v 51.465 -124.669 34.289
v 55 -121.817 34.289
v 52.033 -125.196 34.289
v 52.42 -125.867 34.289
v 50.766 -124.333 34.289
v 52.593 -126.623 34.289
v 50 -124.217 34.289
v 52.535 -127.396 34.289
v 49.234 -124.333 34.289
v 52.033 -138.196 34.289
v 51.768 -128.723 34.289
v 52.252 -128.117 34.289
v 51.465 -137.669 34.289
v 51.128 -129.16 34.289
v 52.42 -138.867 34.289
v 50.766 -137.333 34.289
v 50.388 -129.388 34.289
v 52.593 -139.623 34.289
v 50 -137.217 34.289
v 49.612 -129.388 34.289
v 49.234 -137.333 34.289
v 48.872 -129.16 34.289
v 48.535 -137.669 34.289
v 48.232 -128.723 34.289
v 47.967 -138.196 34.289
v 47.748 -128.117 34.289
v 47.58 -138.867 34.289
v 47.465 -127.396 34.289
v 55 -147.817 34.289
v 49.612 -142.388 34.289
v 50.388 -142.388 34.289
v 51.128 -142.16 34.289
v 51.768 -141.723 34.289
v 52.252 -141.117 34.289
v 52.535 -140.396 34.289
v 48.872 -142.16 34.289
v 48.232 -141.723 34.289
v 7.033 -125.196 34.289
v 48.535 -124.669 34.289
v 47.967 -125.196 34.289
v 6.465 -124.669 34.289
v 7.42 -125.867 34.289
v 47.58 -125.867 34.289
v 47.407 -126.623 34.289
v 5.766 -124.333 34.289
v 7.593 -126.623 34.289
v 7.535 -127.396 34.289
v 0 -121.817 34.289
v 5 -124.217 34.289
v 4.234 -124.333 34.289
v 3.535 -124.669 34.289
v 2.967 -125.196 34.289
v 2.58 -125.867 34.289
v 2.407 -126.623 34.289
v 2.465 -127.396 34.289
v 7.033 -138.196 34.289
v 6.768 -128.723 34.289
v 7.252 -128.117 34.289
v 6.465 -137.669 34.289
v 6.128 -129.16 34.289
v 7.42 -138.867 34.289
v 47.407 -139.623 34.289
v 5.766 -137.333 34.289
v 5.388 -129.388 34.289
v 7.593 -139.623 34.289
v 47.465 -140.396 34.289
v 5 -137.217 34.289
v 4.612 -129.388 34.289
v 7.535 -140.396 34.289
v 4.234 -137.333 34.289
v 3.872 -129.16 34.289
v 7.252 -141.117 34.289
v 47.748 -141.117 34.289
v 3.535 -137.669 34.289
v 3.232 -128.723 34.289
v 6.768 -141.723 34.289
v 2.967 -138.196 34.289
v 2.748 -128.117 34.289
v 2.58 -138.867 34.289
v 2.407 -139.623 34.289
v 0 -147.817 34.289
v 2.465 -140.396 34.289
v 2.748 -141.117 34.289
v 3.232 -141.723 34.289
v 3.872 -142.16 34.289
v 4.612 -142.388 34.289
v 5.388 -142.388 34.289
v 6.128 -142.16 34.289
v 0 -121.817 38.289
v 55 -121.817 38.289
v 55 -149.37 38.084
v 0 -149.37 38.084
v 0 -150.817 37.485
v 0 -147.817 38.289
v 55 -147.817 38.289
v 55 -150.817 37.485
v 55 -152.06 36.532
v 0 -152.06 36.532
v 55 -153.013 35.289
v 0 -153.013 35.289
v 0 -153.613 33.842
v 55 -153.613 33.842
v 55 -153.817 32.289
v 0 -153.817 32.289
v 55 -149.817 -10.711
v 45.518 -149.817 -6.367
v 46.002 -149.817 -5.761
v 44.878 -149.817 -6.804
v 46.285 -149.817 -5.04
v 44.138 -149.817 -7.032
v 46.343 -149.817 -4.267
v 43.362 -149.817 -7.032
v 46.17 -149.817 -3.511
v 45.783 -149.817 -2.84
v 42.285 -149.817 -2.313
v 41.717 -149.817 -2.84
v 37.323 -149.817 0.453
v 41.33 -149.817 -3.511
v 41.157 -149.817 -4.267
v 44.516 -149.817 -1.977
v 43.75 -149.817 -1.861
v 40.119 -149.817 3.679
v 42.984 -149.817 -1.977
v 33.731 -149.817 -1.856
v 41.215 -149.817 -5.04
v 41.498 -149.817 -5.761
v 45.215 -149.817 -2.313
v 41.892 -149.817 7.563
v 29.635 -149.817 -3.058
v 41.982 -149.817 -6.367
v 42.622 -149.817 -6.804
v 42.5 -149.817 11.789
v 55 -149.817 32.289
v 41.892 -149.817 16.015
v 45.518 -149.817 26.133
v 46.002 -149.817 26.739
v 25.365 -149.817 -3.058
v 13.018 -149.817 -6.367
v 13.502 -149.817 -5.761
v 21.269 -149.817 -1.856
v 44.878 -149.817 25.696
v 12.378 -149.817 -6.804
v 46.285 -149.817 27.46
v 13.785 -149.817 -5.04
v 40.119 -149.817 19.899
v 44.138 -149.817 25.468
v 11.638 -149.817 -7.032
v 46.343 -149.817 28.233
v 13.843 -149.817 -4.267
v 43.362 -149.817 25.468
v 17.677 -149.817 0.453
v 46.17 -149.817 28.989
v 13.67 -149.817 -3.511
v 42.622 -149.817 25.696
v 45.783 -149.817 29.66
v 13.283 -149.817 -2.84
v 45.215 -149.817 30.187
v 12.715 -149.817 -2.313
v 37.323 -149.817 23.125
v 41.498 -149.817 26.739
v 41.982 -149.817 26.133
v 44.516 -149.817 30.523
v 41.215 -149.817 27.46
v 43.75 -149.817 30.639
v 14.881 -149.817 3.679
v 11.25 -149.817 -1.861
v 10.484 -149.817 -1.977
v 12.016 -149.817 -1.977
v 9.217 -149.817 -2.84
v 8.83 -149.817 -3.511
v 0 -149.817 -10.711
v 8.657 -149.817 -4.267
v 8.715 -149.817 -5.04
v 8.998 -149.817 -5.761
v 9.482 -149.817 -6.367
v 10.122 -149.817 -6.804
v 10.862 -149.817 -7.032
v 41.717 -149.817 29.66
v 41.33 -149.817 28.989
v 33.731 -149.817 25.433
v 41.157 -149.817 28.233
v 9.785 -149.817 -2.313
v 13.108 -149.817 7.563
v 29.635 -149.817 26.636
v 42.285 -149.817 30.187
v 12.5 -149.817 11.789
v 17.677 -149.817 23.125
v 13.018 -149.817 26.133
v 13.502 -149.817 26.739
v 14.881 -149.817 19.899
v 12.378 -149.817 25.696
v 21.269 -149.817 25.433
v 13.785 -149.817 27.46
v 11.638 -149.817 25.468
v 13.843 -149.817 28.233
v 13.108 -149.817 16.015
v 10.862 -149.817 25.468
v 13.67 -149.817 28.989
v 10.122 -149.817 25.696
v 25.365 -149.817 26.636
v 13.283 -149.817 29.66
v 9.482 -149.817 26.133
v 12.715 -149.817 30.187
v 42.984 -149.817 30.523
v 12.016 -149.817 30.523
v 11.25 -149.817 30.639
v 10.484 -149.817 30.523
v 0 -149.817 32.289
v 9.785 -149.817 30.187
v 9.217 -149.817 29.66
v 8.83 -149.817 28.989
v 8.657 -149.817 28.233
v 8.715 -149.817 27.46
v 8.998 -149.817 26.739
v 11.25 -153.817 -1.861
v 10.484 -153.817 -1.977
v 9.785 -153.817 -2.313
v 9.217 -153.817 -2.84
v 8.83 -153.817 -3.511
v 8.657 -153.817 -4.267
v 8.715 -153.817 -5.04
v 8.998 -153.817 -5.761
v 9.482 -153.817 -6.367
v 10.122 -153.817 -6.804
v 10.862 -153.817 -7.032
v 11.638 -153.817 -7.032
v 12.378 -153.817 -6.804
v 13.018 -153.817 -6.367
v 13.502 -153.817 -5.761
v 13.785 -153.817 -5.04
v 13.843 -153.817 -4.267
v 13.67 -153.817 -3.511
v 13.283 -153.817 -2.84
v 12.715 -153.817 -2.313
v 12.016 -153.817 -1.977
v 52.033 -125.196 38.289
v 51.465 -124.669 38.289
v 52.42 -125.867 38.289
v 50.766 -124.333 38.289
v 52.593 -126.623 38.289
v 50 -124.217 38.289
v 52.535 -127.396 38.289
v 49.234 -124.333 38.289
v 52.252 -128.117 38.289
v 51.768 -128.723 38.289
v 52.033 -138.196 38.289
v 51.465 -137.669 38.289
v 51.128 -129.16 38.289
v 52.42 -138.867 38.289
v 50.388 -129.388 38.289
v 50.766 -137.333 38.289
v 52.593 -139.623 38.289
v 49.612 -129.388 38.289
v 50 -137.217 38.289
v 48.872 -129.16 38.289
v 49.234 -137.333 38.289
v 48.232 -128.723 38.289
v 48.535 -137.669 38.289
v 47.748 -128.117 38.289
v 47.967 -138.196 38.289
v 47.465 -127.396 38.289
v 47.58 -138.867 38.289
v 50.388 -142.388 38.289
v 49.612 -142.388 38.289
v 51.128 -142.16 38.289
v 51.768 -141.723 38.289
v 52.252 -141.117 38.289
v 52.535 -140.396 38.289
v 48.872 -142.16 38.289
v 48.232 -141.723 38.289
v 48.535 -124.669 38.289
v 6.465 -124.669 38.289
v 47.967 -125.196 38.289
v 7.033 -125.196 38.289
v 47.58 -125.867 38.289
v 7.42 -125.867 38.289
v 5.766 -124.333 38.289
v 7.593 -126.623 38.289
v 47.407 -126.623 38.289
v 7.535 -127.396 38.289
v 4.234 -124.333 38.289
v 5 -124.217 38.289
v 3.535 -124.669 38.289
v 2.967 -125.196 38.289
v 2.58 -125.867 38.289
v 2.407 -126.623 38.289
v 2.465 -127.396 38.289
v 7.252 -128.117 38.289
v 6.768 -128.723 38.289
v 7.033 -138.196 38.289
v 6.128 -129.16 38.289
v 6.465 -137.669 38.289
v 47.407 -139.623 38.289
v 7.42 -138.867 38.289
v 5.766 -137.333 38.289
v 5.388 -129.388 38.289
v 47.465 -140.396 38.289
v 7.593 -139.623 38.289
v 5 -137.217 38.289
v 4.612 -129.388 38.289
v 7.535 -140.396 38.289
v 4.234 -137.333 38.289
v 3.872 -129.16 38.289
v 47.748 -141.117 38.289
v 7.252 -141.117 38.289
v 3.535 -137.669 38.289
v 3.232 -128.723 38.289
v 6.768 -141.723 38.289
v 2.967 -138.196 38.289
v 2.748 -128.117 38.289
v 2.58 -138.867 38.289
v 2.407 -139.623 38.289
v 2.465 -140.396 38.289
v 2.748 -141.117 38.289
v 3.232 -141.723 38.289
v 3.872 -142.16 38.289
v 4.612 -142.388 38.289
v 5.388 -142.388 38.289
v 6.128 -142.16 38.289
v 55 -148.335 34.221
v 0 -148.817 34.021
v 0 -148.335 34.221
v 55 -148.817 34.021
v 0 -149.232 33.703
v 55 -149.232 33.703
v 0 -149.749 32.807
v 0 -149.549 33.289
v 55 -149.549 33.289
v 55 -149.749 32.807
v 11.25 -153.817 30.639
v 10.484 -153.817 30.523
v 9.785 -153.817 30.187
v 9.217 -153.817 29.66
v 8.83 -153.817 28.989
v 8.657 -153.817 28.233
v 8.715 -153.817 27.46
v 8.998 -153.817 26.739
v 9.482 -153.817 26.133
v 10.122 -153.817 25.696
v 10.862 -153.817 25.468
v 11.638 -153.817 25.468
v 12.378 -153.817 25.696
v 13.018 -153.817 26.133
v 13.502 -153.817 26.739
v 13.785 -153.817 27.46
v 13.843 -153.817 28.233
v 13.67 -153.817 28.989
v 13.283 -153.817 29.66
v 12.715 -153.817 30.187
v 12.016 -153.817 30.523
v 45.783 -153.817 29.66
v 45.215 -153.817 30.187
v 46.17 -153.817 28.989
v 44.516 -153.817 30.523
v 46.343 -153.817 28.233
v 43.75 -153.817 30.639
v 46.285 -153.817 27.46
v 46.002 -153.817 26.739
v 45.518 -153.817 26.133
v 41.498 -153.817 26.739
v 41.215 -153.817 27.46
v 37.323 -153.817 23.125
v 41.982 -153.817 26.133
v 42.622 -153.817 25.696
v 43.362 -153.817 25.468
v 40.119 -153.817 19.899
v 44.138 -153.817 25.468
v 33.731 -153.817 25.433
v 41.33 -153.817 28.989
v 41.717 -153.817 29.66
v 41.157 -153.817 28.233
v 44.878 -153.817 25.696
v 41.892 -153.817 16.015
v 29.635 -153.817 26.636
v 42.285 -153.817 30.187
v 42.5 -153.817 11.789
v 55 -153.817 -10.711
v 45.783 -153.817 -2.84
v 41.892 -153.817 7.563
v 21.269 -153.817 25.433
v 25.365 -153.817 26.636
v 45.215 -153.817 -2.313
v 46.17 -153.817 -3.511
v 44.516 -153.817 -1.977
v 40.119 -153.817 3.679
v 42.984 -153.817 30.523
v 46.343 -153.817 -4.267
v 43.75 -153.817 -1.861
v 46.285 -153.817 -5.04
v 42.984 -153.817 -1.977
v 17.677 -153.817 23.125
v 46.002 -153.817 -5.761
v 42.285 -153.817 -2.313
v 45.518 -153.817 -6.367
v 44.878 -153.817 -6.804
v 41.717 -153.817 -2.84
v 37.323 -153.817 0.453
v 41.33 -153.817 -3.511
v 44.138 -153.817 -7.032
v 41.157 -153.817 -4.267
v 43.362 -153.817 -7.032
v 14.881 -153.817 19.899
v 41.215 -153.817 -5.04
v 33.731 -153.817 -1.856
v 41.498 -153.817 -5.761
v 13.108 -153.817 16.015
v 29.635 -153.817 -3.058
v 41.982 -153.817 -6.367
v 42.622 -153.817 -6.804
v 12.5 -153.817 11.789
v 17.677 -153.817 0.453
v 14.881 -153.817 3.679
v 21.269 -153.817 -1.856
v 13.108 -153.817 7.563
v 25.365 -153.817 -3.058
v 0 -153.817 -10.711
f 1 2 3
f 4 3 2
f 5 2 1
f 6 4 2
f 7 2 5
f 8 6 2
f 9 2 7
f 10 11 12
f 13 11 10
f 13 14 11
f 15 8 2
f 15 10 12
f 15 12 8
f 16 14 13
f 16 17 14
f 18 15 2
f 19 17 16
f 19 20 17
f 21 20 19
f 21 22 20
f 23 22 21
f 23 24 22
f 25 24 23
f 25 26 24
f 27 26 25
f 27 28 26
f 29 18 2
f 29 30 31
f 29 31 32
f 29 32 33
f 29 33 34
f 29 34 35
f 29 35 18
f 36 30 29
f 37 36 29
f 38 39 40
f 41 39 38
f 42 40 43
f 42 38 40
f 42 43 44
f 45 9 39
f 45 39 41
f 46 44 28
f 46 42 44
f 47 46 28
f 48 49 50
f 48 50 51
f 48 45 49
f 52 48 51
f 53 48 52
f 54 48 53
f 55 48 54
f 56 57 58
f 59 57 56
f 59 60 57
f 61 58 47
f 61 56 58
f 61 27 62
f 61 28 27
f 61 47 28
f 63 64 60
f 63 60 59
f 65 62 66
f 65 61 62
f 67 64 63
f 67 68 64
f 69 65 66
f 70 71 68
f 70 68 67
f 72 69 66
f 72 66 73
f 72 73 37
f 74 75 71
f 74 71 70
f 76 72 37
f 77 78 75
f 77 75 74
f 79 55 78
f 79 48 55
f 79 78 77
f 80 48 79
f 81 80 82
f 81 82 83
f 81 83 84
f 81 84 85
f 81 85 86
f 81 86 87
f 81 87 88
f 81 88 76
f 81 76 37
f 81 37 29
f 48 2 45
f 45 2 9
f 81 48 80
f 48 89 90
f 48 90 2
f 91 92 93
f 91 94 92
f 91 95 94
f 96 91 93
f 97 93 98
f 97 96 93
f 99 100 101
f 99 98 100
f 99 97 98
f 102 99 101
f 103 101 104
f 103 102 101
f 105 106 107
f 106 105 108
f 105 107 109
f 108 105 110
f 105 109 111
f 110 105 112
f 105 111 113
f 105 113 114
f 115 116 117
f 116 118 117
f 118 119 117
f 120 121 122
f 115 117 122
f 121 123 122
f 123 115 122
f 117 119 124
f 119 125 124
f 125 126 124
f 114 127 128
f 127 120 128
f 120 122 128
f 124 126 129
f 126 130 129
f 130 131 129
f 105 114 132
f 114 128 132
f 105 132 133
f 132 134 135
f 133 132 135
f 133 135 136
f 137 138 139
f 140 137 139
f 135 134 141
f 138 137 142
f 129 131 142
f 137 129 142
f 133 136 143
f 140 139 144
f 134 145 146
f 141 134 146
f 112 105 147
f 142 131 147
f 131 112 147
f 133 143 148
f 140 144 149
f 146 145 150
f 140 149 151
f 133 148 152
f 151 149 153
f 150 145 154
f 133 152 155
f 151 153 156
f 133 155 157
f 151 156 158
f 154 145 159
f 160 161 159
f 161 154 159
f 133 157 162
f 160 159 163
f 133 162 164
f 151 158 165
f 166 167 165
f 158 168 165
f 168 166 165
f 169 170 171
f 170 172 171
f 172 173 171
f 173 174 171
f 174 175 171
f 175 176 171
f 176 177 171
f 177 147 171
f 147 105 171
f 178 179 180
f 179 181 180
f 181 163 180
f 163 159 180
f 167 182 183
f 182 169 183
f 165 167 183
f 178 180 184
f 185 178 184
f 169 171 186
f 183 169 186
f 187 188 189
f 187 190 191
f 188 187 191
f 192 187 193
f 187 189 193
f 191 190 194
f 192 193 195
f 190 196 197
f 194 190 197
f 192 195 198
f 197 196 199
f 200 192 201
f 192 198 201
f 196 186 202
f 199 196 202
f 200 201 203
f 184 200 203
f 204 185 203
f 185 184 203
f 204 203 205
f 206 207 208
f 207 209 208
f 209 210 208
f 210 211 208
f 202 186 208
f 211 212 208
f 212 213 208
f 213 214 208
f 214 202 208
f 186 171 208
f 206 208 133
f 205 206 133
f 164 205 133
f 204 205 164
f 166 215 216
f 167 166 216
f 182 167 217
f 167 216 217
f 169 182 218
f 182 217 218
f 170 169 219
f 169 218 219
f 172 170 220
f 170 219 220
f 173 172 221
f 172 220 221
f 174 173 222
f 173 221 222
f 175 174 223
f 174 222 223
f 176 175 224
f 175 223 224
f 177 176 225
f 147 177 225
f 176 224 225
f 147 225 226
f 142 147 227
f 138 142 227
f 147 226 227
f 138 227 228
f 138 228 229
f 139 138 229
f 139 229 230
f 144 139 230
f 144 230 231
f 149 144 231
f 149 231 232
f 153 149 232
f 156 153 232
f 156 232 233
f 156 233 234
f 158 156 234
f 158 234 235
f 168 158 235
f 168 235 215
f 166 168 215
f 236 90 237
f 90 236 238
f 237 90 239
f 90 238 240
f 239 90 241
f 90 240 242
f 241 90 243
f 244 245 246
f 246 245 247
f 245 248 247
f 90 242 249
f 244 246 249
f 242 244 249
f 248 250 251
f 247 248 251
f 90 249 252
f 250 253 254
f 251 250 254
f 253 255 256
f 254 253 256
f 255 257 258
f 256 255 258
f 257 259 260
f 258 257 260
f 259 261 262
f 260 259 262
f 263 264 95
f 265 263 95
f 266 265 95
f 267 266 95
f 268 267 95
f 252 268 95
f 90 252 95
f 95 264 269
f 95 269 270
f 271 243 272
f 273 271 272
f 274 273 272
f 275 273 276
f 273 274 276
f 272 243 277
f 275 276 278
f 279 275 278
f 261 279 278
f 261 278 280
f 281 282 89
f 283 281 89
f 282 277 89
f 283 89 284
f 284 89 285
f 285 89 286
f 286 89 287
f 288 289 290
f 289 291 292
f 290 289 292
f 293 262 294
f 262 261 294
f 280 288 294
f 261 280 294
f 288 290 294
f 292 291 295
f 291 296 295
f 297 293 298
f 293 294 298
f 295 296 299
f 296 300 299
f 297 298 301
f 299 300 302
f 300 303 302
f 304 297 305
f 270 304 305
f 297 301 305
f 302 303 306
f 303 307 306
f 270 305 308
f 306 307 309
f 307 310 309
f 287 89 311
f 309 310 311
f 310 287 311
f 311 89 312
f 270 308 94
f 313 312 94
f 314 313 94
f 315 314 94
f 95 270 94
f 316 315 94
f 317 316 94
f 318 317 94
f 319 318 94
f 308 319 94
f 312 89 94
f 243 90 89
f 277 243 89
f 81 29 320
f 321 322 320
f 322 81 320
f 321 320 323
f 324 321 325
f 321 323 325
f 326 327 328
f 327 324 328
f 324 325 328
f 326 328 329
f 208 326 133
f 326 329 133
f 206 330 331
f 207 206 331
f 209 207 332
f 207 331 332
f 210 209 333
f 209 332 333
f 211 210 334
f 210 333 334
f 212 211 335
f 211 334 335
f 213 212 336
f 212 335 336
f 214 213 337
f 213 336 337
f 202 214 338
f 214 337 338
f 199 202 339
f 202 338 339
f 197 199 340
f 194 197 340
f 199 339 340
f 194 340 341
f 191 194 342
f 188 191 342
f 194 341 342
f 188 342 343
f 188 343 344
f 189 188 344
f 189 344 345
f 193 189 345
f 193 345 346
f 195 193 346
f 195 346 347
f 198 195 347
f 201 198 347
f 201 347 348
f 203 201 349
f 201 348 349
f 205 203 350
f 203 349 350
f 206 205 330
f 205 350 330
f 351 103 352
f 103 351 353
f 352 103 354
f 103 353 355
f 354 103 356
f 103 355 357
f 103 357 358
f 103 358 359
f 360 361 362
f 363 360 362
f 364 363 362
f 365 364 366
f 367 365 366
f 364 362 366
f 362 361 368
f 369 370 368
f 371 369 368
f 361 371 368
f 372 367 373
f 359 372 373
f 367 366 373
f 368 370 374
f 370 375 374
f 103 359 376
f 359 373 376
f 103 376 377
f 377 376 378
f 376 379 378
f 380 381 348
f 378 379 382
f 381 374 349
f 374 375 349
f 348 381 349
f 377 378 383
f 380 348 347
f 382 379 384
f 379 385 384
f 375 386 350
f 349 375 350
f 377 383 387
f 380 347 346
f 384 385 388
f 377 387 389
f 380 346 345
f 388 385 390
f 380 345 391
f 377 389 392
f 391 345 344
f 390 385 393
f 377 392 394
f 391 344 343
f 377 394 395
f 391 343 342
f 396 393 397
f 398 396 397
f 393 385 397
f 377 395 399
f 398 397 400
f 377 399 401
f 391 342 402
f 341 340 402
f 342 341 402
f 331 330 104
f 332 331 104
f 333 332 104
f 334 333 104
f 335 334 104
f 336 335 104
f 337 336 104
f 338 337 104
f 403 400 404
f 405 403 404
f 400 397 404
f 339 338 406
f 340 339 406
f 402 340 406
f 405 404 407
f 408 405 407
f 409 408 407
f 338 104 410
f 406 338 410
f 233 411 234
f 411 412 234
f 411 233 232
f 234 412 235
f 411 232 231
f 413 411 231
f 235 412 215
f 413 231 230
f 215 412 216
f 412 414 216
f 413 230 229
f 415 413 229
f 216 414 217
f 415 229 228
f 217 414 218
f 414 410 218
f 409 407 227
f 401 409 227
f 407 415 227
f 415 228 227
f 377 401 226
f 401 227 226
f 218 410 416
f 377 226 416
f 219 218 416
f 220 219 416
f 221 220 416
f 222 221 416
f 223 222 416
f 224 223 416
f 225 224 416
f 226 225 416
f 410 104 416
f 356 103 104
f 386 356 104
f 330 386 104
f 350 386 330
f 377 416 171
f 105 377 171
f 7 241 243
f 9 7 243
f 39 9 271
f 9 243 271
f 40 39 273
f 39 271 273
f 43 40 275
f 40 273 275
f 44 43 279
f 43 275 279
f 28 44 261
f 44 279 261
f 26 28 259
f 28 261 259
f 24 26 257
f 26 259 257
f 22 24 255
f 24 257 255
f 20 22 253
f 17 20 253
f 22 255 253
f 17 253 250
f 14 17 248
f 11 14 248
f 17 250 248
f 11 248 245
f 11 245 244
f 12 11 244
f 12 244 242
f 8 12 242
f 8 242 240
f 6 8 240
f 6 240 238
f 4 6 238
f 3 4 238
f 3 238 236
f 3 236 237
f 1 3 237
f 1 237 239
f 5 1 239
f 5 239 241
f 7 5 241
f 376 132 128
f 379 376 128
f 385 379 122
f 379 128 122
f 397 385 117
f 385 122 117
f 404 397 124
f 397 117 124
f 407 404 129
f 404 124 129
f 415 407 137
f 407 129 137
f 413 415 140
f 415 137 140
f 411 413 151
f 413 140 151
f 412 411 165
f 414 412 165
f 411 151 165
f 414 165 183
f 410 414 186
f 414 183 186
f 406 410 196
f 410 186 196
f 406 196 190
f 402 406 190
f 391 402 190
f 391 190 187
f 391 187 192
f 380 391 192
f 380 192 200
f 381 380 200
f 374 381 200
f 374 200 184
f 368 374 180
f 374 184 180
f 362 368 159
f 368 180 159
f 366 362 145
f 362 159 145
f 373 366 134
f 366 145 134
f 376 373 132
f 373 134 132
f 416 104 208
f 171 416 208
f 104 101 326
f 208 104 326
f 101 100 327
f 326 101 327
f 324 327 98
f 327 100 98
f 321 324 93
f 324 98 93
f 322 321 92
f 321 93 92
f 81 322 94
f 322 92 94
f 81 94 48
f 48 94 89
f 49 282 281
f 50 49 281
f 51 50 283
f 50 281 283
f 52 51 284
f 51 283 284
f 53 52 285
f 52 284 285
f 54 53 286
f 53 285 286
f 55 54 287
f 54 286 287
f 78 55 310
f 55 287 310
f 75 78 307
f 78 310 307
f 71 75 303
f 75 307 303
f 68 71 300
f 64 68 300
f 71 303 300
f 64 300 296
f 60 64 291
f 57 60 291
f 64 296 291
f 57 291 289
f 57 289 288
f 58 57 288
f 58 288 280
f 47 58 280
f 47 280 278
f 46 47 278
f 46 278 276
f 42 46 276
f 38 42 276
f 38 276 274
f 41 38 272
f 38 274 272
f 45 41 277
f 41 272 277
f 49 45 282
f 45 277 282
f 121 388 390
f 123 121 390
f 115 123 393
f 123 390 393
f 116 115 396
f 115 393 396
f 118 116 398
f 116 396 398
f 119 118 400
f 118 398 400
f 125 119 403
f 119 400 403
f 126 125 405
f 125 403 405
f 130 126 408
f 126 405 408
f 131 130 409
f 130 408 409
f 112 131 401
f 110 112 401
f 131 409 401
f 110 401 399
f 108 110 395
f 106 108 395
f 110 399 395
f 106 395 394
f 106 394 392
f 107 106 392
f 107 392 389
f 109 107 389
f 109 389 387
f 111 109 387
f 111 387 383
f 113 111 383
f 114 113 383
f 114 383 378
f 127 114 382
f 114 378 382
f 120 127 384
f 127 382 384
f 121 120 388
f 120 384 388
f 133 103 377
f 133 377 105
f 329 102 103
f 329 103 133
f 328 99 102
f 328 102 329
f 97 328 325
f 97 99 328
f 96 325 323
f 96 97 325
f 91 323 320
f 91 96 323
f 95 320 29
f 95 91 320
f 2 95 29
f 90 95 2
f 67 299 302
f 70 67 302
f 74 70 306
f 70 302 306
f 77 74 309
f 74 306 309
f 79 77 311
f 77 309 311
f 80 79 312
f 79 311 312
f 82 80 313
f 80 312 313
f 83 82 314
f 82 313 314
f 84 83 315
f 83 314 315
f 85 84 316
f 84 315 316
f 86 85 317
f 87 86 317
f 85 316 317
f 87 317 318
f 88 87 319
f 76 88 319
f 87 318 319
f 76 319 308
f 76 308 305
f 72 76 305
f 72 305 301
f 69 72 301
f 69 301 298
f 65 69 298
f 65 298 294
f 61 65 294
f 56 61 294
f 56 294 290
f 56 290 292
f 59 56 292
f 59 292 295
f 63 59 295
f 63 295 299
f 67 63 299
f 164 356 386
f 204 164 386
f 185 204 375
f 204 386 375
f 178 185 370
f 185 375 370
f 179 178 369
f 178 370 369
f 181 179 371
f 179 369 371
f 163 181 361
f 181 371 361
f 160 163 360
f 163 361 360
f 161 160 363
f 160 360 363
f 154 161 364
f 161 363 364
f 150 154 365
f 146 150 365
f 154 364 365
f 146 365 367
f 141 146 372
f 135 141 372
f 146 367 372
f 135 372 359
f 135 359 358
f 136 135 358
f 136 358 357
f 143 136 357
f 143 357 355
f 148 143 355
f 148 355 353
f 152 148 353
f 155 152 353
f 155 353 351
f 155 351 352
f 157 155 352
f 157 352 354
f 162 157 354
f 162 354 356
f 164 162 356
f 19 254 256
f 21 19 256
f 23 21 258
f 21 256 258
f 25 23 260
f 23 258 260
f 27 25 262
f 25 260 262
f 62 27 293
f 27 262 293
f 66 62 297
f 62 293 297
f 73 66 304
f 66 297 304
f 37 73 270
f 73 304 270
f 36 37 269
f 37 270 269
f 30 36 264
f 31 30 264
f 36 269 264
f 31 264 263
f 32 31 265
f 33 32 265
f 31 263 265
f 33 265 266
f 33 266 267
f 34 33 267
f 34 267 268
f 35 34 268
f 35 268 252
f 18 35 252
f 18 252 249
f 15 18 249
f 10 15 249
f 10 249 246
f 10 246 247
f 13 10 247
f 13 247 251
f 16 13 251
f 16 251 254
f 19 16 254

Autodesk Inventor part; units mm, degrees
ref_plane "YZ Plane" through (0, 0, 0) normal (1, 0, 0) x (0, 1, 0)
ref_plane "XZ Plane" through (0, 0, 0) normal (0, 1, 0) x (-1, 0, 0)
ref_plane "XY Plane" through (0, 0, 0) normal (0, 0, 1) x (1, 0, 0)
sketch "Skizze1" plane through (0, 0, 0) normal (1, 0, 0) x (0, 1, 0)
  line L0 (-153.8173, -10.7111) -> (-149.8173, -10.7111)
  line L1 (-149.8173, -10.7111) -> (-149.8173, 38.2889)
  line L2 (-149.8173, 38.2889) -> (-153.8173, 38.2889)
  line L3 (-153.8173, 38.2889) -> (-153.8173, -10.7111)
  line L4 (-153.8173, 38.2889) -> (-121.8173, 38.2889)
  line L5 (-121.8173, 38.2889) -> (-121.8173, 34.2889)
  line L6 (-121.8173, 34.2889) -> (-153.8173, 34.2889)
  line L7 (-153.8173, 34.2889) -> (-153.8173, 38.2889)
  point P0 (0, 0)
  point P1 (-149.8173, 34.2889)
  point P2 (-151.8173, -10.7111)
  dimension "d0" = 4
  dimension "d2" = 32
  dimension "d3" = 4
  dimension "d10" = 45
extrude "Extrusion1" add sketch "Skizze1" along normal blind 55
fillet "Rundung1" radius 2 1 edges at (27.5, -149.8173, 34.2889)
fillet "Rundung2" radius 6 1 edges at (27.5, -153.8173, 38.2889)
sketch "Skizze2" plane through (0, -149.8173, -10.7111) normal (0, 1, 0) x (1, 0, 0)
  line L0 (0, -45) -> (55, -45) projected
  line L1 (55, -43) -> (0, -43) projected
  line L2 (55, 0) -> (55, -43) projected
  point P0 (0, -10.7111)
  point P1 (43.75, -38.75)
  dimension "d9" = 4.25
  dimension "d24" = 11.25
hole "Bohrung1" at (43.75, -149.8173, 28.0389) direction (0, -1, 0) diameter 5.2 end through all
pattern_linear "Rechteckige Anordnung1" count 2 spacing 32.5 along (-1, 0, 0) count 2 spacing 32.5 along (0, 0, -1) of "Bohrung1"
sketch "Skizze3" plane through (55, -121.8173, 34.2889) normal (0, 0, -1) x (-1, 0, 0)
  line L0 (55, -28) -> (0, -28) projected
  line L1 (55, -26) -> (0, -26) projected
  line L2 (0, -26) -> (0, 0) projected
  point P0 (55, 121.8173)
  point P1 (5, -18)
  dimension "d27" = 5
  dimension "d28" = 10
hole "Bohrung2" at (50, -139.8173, 34.2889) direction (0, 0, 1) diameter 5.2 end through all
pattern_linear "Rechteckige Anordnung2" count 2 spacing 13 along (0, 1, 0) count 2 spacing 45 along (-1, 0, 0) of "Bohrung2"
sketch "Skizze4" plane through (0, -149.8173, -10.7111) normal (0, 1, 0) x (1, 0, 0)
  circle A0 centre (43.75, -38.75) radius 2.6 construction
  circle A1 centre (11.25, -6.25) radius 2.6 construction
  line L0 (43.75, -38.75) -> (11.25, -38.75) construction
  line L1 (11.25, -38.75) -> (11.25, -6.25) construction
  line L2 (11.25, -6.25) -> (43.75, -6.25) construction
  line L3 (43.75, -6.25) -> (43.75, -38.75) construction
  line L4 (43.75, -38.75) -> (11.25, -6.25) construction
  line L5 (43.75, -6.25) -> (11.25, -38.75) construction
  circle A2 centre (27.5, -22.5) radius 15
  point P0 (0, -10.7111)
  dimension "d42" = 30
extrude "Extrusion2" cut sketch "Skizze4" against normal through all
properties part number "TS_V1_Fallmagazin_Zylinderhalter_int"
